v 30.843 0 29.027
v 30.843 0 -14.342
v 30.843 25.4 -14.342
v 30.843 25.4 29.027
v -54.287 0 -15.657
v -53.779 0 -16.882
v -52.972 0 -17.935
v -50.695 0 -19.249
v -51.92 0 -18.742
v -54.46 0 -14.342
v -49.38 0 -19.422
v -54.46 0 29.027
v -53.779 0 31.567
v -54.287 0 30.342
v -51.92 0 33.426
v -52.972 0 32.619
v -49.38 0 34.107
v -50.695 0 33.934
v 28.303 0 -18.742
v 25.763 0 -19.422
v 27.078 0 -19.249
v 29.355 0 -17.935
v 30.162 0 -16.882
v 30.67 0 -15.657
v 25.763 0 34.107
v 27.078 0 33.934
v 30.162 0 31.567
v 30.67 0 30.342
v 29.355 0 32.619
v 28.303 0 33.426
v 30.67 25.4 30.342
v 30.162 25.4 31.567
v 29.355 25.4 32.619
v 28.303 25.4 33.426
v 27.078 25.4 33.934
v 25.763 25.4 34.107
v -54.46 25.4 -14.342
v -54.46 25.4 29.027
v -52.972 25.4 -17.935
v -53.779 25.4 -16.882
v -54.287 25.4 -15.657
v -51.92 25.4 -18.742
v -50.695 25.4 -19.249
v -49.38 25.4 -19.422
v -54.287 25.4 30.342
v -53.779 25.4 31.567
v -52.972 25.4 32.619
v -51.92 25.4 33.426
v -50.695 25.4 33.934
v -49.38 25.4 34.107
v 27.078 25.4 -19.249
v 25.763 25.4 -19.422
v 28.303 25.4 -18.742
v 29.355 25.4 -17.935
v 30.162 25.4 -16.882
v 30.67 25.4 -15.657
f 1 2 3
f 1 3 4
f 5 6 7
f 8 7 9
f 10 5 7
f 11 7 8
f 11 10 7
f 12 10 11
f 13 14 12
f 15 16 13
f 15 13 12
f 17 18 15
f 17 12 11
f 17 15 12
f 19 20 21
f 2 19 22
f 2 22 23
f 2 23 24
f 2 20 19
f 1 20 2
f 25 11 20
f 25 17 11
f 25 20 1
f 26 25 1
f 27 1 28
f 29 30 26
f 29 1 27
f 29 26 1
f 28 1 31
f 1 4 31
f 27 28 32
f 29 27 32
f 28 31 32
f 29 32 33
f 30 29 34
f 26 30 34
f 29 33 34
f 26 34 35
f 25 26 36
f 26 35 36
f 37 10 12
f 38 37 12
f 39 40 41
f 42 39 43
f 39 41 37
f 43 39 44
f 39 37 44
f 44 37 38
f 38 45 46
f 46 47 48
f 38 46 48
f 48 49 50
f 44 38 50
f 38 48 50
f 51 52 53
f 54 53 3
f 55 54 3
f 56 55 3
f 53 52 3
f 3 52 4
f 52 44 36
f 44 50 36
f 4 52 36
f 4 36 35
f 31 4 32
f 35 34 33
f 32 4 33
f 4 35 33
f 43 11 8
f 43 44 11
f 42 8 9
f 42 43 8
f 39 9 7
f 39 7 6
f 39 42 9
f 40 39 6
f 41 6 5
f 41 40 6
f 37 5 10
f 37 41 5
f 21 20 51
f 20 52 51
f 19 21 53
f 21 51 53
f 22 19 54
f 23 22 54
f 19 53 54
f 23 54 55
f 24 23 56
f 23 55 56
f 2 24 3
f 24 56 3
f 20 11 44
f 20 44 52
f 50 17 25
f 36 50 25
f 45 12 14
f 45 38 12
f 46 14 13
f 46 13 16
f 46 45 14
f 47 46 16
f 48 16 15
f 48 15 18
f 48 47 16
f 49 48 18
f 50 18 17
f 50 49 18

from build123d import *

# Parameters (mm, degrees)
F0_W     = 85.303154
F0_H     = 53.529274
F1_DEPTH = 25.4
F2_R     = 5.08
F3_R     = 5.08
F4_W     = 50.8
F4_H     = 50.8
F5_ANGLE = 30


with BuildPart() as f1:
    # F0 (on Front) → F1 (new body)
    with BuildSketch(Plane.XZ):
        with Locations((-11.808498, 7.342195)):
            Rectangle(F0_W, F0_H)
    extrude(amount=-F1_DEPTH)

    # F2
    f2_edges = [f1.edges().sort_by_distance(p)[0] for p in [
        (30.843079, 12.7, 34.106832),
        (30.843079, 12.7, -19.422442),
    ]]
    fillet(f2_edges, radius=F2_R)

    # F3
    f3_edges = [f1.edges().sort_by_distance(p)[0] for p in [
        (-54.460075, 12.7, 34.106832),
        (-54.460075, 12.7, -19.422442),
    ]]
    fillet(f3_edges, radius=F3_R)


with BuildPart() as f5:
    # F4 (on Top) → F5 (revolve, symmetric)
    with BuildSketch(Plane.XY) as f5_sk:
        with Locations((-87.164474, -30.215205)):
            Rectangle(F4_W, F4_H)
    revolve(axis=Axis((-61.764474, -30.215205, 0), (0, 1, 0)), revolution_arc=F5_ANGLE / 2)
    revolve(f5_sk.sketch, axis=Axis((-61.764474, -30.215205, 0), (0, -1, 0)), revolution_arc=F5_ANGLE / 2)


solid = f1.part
